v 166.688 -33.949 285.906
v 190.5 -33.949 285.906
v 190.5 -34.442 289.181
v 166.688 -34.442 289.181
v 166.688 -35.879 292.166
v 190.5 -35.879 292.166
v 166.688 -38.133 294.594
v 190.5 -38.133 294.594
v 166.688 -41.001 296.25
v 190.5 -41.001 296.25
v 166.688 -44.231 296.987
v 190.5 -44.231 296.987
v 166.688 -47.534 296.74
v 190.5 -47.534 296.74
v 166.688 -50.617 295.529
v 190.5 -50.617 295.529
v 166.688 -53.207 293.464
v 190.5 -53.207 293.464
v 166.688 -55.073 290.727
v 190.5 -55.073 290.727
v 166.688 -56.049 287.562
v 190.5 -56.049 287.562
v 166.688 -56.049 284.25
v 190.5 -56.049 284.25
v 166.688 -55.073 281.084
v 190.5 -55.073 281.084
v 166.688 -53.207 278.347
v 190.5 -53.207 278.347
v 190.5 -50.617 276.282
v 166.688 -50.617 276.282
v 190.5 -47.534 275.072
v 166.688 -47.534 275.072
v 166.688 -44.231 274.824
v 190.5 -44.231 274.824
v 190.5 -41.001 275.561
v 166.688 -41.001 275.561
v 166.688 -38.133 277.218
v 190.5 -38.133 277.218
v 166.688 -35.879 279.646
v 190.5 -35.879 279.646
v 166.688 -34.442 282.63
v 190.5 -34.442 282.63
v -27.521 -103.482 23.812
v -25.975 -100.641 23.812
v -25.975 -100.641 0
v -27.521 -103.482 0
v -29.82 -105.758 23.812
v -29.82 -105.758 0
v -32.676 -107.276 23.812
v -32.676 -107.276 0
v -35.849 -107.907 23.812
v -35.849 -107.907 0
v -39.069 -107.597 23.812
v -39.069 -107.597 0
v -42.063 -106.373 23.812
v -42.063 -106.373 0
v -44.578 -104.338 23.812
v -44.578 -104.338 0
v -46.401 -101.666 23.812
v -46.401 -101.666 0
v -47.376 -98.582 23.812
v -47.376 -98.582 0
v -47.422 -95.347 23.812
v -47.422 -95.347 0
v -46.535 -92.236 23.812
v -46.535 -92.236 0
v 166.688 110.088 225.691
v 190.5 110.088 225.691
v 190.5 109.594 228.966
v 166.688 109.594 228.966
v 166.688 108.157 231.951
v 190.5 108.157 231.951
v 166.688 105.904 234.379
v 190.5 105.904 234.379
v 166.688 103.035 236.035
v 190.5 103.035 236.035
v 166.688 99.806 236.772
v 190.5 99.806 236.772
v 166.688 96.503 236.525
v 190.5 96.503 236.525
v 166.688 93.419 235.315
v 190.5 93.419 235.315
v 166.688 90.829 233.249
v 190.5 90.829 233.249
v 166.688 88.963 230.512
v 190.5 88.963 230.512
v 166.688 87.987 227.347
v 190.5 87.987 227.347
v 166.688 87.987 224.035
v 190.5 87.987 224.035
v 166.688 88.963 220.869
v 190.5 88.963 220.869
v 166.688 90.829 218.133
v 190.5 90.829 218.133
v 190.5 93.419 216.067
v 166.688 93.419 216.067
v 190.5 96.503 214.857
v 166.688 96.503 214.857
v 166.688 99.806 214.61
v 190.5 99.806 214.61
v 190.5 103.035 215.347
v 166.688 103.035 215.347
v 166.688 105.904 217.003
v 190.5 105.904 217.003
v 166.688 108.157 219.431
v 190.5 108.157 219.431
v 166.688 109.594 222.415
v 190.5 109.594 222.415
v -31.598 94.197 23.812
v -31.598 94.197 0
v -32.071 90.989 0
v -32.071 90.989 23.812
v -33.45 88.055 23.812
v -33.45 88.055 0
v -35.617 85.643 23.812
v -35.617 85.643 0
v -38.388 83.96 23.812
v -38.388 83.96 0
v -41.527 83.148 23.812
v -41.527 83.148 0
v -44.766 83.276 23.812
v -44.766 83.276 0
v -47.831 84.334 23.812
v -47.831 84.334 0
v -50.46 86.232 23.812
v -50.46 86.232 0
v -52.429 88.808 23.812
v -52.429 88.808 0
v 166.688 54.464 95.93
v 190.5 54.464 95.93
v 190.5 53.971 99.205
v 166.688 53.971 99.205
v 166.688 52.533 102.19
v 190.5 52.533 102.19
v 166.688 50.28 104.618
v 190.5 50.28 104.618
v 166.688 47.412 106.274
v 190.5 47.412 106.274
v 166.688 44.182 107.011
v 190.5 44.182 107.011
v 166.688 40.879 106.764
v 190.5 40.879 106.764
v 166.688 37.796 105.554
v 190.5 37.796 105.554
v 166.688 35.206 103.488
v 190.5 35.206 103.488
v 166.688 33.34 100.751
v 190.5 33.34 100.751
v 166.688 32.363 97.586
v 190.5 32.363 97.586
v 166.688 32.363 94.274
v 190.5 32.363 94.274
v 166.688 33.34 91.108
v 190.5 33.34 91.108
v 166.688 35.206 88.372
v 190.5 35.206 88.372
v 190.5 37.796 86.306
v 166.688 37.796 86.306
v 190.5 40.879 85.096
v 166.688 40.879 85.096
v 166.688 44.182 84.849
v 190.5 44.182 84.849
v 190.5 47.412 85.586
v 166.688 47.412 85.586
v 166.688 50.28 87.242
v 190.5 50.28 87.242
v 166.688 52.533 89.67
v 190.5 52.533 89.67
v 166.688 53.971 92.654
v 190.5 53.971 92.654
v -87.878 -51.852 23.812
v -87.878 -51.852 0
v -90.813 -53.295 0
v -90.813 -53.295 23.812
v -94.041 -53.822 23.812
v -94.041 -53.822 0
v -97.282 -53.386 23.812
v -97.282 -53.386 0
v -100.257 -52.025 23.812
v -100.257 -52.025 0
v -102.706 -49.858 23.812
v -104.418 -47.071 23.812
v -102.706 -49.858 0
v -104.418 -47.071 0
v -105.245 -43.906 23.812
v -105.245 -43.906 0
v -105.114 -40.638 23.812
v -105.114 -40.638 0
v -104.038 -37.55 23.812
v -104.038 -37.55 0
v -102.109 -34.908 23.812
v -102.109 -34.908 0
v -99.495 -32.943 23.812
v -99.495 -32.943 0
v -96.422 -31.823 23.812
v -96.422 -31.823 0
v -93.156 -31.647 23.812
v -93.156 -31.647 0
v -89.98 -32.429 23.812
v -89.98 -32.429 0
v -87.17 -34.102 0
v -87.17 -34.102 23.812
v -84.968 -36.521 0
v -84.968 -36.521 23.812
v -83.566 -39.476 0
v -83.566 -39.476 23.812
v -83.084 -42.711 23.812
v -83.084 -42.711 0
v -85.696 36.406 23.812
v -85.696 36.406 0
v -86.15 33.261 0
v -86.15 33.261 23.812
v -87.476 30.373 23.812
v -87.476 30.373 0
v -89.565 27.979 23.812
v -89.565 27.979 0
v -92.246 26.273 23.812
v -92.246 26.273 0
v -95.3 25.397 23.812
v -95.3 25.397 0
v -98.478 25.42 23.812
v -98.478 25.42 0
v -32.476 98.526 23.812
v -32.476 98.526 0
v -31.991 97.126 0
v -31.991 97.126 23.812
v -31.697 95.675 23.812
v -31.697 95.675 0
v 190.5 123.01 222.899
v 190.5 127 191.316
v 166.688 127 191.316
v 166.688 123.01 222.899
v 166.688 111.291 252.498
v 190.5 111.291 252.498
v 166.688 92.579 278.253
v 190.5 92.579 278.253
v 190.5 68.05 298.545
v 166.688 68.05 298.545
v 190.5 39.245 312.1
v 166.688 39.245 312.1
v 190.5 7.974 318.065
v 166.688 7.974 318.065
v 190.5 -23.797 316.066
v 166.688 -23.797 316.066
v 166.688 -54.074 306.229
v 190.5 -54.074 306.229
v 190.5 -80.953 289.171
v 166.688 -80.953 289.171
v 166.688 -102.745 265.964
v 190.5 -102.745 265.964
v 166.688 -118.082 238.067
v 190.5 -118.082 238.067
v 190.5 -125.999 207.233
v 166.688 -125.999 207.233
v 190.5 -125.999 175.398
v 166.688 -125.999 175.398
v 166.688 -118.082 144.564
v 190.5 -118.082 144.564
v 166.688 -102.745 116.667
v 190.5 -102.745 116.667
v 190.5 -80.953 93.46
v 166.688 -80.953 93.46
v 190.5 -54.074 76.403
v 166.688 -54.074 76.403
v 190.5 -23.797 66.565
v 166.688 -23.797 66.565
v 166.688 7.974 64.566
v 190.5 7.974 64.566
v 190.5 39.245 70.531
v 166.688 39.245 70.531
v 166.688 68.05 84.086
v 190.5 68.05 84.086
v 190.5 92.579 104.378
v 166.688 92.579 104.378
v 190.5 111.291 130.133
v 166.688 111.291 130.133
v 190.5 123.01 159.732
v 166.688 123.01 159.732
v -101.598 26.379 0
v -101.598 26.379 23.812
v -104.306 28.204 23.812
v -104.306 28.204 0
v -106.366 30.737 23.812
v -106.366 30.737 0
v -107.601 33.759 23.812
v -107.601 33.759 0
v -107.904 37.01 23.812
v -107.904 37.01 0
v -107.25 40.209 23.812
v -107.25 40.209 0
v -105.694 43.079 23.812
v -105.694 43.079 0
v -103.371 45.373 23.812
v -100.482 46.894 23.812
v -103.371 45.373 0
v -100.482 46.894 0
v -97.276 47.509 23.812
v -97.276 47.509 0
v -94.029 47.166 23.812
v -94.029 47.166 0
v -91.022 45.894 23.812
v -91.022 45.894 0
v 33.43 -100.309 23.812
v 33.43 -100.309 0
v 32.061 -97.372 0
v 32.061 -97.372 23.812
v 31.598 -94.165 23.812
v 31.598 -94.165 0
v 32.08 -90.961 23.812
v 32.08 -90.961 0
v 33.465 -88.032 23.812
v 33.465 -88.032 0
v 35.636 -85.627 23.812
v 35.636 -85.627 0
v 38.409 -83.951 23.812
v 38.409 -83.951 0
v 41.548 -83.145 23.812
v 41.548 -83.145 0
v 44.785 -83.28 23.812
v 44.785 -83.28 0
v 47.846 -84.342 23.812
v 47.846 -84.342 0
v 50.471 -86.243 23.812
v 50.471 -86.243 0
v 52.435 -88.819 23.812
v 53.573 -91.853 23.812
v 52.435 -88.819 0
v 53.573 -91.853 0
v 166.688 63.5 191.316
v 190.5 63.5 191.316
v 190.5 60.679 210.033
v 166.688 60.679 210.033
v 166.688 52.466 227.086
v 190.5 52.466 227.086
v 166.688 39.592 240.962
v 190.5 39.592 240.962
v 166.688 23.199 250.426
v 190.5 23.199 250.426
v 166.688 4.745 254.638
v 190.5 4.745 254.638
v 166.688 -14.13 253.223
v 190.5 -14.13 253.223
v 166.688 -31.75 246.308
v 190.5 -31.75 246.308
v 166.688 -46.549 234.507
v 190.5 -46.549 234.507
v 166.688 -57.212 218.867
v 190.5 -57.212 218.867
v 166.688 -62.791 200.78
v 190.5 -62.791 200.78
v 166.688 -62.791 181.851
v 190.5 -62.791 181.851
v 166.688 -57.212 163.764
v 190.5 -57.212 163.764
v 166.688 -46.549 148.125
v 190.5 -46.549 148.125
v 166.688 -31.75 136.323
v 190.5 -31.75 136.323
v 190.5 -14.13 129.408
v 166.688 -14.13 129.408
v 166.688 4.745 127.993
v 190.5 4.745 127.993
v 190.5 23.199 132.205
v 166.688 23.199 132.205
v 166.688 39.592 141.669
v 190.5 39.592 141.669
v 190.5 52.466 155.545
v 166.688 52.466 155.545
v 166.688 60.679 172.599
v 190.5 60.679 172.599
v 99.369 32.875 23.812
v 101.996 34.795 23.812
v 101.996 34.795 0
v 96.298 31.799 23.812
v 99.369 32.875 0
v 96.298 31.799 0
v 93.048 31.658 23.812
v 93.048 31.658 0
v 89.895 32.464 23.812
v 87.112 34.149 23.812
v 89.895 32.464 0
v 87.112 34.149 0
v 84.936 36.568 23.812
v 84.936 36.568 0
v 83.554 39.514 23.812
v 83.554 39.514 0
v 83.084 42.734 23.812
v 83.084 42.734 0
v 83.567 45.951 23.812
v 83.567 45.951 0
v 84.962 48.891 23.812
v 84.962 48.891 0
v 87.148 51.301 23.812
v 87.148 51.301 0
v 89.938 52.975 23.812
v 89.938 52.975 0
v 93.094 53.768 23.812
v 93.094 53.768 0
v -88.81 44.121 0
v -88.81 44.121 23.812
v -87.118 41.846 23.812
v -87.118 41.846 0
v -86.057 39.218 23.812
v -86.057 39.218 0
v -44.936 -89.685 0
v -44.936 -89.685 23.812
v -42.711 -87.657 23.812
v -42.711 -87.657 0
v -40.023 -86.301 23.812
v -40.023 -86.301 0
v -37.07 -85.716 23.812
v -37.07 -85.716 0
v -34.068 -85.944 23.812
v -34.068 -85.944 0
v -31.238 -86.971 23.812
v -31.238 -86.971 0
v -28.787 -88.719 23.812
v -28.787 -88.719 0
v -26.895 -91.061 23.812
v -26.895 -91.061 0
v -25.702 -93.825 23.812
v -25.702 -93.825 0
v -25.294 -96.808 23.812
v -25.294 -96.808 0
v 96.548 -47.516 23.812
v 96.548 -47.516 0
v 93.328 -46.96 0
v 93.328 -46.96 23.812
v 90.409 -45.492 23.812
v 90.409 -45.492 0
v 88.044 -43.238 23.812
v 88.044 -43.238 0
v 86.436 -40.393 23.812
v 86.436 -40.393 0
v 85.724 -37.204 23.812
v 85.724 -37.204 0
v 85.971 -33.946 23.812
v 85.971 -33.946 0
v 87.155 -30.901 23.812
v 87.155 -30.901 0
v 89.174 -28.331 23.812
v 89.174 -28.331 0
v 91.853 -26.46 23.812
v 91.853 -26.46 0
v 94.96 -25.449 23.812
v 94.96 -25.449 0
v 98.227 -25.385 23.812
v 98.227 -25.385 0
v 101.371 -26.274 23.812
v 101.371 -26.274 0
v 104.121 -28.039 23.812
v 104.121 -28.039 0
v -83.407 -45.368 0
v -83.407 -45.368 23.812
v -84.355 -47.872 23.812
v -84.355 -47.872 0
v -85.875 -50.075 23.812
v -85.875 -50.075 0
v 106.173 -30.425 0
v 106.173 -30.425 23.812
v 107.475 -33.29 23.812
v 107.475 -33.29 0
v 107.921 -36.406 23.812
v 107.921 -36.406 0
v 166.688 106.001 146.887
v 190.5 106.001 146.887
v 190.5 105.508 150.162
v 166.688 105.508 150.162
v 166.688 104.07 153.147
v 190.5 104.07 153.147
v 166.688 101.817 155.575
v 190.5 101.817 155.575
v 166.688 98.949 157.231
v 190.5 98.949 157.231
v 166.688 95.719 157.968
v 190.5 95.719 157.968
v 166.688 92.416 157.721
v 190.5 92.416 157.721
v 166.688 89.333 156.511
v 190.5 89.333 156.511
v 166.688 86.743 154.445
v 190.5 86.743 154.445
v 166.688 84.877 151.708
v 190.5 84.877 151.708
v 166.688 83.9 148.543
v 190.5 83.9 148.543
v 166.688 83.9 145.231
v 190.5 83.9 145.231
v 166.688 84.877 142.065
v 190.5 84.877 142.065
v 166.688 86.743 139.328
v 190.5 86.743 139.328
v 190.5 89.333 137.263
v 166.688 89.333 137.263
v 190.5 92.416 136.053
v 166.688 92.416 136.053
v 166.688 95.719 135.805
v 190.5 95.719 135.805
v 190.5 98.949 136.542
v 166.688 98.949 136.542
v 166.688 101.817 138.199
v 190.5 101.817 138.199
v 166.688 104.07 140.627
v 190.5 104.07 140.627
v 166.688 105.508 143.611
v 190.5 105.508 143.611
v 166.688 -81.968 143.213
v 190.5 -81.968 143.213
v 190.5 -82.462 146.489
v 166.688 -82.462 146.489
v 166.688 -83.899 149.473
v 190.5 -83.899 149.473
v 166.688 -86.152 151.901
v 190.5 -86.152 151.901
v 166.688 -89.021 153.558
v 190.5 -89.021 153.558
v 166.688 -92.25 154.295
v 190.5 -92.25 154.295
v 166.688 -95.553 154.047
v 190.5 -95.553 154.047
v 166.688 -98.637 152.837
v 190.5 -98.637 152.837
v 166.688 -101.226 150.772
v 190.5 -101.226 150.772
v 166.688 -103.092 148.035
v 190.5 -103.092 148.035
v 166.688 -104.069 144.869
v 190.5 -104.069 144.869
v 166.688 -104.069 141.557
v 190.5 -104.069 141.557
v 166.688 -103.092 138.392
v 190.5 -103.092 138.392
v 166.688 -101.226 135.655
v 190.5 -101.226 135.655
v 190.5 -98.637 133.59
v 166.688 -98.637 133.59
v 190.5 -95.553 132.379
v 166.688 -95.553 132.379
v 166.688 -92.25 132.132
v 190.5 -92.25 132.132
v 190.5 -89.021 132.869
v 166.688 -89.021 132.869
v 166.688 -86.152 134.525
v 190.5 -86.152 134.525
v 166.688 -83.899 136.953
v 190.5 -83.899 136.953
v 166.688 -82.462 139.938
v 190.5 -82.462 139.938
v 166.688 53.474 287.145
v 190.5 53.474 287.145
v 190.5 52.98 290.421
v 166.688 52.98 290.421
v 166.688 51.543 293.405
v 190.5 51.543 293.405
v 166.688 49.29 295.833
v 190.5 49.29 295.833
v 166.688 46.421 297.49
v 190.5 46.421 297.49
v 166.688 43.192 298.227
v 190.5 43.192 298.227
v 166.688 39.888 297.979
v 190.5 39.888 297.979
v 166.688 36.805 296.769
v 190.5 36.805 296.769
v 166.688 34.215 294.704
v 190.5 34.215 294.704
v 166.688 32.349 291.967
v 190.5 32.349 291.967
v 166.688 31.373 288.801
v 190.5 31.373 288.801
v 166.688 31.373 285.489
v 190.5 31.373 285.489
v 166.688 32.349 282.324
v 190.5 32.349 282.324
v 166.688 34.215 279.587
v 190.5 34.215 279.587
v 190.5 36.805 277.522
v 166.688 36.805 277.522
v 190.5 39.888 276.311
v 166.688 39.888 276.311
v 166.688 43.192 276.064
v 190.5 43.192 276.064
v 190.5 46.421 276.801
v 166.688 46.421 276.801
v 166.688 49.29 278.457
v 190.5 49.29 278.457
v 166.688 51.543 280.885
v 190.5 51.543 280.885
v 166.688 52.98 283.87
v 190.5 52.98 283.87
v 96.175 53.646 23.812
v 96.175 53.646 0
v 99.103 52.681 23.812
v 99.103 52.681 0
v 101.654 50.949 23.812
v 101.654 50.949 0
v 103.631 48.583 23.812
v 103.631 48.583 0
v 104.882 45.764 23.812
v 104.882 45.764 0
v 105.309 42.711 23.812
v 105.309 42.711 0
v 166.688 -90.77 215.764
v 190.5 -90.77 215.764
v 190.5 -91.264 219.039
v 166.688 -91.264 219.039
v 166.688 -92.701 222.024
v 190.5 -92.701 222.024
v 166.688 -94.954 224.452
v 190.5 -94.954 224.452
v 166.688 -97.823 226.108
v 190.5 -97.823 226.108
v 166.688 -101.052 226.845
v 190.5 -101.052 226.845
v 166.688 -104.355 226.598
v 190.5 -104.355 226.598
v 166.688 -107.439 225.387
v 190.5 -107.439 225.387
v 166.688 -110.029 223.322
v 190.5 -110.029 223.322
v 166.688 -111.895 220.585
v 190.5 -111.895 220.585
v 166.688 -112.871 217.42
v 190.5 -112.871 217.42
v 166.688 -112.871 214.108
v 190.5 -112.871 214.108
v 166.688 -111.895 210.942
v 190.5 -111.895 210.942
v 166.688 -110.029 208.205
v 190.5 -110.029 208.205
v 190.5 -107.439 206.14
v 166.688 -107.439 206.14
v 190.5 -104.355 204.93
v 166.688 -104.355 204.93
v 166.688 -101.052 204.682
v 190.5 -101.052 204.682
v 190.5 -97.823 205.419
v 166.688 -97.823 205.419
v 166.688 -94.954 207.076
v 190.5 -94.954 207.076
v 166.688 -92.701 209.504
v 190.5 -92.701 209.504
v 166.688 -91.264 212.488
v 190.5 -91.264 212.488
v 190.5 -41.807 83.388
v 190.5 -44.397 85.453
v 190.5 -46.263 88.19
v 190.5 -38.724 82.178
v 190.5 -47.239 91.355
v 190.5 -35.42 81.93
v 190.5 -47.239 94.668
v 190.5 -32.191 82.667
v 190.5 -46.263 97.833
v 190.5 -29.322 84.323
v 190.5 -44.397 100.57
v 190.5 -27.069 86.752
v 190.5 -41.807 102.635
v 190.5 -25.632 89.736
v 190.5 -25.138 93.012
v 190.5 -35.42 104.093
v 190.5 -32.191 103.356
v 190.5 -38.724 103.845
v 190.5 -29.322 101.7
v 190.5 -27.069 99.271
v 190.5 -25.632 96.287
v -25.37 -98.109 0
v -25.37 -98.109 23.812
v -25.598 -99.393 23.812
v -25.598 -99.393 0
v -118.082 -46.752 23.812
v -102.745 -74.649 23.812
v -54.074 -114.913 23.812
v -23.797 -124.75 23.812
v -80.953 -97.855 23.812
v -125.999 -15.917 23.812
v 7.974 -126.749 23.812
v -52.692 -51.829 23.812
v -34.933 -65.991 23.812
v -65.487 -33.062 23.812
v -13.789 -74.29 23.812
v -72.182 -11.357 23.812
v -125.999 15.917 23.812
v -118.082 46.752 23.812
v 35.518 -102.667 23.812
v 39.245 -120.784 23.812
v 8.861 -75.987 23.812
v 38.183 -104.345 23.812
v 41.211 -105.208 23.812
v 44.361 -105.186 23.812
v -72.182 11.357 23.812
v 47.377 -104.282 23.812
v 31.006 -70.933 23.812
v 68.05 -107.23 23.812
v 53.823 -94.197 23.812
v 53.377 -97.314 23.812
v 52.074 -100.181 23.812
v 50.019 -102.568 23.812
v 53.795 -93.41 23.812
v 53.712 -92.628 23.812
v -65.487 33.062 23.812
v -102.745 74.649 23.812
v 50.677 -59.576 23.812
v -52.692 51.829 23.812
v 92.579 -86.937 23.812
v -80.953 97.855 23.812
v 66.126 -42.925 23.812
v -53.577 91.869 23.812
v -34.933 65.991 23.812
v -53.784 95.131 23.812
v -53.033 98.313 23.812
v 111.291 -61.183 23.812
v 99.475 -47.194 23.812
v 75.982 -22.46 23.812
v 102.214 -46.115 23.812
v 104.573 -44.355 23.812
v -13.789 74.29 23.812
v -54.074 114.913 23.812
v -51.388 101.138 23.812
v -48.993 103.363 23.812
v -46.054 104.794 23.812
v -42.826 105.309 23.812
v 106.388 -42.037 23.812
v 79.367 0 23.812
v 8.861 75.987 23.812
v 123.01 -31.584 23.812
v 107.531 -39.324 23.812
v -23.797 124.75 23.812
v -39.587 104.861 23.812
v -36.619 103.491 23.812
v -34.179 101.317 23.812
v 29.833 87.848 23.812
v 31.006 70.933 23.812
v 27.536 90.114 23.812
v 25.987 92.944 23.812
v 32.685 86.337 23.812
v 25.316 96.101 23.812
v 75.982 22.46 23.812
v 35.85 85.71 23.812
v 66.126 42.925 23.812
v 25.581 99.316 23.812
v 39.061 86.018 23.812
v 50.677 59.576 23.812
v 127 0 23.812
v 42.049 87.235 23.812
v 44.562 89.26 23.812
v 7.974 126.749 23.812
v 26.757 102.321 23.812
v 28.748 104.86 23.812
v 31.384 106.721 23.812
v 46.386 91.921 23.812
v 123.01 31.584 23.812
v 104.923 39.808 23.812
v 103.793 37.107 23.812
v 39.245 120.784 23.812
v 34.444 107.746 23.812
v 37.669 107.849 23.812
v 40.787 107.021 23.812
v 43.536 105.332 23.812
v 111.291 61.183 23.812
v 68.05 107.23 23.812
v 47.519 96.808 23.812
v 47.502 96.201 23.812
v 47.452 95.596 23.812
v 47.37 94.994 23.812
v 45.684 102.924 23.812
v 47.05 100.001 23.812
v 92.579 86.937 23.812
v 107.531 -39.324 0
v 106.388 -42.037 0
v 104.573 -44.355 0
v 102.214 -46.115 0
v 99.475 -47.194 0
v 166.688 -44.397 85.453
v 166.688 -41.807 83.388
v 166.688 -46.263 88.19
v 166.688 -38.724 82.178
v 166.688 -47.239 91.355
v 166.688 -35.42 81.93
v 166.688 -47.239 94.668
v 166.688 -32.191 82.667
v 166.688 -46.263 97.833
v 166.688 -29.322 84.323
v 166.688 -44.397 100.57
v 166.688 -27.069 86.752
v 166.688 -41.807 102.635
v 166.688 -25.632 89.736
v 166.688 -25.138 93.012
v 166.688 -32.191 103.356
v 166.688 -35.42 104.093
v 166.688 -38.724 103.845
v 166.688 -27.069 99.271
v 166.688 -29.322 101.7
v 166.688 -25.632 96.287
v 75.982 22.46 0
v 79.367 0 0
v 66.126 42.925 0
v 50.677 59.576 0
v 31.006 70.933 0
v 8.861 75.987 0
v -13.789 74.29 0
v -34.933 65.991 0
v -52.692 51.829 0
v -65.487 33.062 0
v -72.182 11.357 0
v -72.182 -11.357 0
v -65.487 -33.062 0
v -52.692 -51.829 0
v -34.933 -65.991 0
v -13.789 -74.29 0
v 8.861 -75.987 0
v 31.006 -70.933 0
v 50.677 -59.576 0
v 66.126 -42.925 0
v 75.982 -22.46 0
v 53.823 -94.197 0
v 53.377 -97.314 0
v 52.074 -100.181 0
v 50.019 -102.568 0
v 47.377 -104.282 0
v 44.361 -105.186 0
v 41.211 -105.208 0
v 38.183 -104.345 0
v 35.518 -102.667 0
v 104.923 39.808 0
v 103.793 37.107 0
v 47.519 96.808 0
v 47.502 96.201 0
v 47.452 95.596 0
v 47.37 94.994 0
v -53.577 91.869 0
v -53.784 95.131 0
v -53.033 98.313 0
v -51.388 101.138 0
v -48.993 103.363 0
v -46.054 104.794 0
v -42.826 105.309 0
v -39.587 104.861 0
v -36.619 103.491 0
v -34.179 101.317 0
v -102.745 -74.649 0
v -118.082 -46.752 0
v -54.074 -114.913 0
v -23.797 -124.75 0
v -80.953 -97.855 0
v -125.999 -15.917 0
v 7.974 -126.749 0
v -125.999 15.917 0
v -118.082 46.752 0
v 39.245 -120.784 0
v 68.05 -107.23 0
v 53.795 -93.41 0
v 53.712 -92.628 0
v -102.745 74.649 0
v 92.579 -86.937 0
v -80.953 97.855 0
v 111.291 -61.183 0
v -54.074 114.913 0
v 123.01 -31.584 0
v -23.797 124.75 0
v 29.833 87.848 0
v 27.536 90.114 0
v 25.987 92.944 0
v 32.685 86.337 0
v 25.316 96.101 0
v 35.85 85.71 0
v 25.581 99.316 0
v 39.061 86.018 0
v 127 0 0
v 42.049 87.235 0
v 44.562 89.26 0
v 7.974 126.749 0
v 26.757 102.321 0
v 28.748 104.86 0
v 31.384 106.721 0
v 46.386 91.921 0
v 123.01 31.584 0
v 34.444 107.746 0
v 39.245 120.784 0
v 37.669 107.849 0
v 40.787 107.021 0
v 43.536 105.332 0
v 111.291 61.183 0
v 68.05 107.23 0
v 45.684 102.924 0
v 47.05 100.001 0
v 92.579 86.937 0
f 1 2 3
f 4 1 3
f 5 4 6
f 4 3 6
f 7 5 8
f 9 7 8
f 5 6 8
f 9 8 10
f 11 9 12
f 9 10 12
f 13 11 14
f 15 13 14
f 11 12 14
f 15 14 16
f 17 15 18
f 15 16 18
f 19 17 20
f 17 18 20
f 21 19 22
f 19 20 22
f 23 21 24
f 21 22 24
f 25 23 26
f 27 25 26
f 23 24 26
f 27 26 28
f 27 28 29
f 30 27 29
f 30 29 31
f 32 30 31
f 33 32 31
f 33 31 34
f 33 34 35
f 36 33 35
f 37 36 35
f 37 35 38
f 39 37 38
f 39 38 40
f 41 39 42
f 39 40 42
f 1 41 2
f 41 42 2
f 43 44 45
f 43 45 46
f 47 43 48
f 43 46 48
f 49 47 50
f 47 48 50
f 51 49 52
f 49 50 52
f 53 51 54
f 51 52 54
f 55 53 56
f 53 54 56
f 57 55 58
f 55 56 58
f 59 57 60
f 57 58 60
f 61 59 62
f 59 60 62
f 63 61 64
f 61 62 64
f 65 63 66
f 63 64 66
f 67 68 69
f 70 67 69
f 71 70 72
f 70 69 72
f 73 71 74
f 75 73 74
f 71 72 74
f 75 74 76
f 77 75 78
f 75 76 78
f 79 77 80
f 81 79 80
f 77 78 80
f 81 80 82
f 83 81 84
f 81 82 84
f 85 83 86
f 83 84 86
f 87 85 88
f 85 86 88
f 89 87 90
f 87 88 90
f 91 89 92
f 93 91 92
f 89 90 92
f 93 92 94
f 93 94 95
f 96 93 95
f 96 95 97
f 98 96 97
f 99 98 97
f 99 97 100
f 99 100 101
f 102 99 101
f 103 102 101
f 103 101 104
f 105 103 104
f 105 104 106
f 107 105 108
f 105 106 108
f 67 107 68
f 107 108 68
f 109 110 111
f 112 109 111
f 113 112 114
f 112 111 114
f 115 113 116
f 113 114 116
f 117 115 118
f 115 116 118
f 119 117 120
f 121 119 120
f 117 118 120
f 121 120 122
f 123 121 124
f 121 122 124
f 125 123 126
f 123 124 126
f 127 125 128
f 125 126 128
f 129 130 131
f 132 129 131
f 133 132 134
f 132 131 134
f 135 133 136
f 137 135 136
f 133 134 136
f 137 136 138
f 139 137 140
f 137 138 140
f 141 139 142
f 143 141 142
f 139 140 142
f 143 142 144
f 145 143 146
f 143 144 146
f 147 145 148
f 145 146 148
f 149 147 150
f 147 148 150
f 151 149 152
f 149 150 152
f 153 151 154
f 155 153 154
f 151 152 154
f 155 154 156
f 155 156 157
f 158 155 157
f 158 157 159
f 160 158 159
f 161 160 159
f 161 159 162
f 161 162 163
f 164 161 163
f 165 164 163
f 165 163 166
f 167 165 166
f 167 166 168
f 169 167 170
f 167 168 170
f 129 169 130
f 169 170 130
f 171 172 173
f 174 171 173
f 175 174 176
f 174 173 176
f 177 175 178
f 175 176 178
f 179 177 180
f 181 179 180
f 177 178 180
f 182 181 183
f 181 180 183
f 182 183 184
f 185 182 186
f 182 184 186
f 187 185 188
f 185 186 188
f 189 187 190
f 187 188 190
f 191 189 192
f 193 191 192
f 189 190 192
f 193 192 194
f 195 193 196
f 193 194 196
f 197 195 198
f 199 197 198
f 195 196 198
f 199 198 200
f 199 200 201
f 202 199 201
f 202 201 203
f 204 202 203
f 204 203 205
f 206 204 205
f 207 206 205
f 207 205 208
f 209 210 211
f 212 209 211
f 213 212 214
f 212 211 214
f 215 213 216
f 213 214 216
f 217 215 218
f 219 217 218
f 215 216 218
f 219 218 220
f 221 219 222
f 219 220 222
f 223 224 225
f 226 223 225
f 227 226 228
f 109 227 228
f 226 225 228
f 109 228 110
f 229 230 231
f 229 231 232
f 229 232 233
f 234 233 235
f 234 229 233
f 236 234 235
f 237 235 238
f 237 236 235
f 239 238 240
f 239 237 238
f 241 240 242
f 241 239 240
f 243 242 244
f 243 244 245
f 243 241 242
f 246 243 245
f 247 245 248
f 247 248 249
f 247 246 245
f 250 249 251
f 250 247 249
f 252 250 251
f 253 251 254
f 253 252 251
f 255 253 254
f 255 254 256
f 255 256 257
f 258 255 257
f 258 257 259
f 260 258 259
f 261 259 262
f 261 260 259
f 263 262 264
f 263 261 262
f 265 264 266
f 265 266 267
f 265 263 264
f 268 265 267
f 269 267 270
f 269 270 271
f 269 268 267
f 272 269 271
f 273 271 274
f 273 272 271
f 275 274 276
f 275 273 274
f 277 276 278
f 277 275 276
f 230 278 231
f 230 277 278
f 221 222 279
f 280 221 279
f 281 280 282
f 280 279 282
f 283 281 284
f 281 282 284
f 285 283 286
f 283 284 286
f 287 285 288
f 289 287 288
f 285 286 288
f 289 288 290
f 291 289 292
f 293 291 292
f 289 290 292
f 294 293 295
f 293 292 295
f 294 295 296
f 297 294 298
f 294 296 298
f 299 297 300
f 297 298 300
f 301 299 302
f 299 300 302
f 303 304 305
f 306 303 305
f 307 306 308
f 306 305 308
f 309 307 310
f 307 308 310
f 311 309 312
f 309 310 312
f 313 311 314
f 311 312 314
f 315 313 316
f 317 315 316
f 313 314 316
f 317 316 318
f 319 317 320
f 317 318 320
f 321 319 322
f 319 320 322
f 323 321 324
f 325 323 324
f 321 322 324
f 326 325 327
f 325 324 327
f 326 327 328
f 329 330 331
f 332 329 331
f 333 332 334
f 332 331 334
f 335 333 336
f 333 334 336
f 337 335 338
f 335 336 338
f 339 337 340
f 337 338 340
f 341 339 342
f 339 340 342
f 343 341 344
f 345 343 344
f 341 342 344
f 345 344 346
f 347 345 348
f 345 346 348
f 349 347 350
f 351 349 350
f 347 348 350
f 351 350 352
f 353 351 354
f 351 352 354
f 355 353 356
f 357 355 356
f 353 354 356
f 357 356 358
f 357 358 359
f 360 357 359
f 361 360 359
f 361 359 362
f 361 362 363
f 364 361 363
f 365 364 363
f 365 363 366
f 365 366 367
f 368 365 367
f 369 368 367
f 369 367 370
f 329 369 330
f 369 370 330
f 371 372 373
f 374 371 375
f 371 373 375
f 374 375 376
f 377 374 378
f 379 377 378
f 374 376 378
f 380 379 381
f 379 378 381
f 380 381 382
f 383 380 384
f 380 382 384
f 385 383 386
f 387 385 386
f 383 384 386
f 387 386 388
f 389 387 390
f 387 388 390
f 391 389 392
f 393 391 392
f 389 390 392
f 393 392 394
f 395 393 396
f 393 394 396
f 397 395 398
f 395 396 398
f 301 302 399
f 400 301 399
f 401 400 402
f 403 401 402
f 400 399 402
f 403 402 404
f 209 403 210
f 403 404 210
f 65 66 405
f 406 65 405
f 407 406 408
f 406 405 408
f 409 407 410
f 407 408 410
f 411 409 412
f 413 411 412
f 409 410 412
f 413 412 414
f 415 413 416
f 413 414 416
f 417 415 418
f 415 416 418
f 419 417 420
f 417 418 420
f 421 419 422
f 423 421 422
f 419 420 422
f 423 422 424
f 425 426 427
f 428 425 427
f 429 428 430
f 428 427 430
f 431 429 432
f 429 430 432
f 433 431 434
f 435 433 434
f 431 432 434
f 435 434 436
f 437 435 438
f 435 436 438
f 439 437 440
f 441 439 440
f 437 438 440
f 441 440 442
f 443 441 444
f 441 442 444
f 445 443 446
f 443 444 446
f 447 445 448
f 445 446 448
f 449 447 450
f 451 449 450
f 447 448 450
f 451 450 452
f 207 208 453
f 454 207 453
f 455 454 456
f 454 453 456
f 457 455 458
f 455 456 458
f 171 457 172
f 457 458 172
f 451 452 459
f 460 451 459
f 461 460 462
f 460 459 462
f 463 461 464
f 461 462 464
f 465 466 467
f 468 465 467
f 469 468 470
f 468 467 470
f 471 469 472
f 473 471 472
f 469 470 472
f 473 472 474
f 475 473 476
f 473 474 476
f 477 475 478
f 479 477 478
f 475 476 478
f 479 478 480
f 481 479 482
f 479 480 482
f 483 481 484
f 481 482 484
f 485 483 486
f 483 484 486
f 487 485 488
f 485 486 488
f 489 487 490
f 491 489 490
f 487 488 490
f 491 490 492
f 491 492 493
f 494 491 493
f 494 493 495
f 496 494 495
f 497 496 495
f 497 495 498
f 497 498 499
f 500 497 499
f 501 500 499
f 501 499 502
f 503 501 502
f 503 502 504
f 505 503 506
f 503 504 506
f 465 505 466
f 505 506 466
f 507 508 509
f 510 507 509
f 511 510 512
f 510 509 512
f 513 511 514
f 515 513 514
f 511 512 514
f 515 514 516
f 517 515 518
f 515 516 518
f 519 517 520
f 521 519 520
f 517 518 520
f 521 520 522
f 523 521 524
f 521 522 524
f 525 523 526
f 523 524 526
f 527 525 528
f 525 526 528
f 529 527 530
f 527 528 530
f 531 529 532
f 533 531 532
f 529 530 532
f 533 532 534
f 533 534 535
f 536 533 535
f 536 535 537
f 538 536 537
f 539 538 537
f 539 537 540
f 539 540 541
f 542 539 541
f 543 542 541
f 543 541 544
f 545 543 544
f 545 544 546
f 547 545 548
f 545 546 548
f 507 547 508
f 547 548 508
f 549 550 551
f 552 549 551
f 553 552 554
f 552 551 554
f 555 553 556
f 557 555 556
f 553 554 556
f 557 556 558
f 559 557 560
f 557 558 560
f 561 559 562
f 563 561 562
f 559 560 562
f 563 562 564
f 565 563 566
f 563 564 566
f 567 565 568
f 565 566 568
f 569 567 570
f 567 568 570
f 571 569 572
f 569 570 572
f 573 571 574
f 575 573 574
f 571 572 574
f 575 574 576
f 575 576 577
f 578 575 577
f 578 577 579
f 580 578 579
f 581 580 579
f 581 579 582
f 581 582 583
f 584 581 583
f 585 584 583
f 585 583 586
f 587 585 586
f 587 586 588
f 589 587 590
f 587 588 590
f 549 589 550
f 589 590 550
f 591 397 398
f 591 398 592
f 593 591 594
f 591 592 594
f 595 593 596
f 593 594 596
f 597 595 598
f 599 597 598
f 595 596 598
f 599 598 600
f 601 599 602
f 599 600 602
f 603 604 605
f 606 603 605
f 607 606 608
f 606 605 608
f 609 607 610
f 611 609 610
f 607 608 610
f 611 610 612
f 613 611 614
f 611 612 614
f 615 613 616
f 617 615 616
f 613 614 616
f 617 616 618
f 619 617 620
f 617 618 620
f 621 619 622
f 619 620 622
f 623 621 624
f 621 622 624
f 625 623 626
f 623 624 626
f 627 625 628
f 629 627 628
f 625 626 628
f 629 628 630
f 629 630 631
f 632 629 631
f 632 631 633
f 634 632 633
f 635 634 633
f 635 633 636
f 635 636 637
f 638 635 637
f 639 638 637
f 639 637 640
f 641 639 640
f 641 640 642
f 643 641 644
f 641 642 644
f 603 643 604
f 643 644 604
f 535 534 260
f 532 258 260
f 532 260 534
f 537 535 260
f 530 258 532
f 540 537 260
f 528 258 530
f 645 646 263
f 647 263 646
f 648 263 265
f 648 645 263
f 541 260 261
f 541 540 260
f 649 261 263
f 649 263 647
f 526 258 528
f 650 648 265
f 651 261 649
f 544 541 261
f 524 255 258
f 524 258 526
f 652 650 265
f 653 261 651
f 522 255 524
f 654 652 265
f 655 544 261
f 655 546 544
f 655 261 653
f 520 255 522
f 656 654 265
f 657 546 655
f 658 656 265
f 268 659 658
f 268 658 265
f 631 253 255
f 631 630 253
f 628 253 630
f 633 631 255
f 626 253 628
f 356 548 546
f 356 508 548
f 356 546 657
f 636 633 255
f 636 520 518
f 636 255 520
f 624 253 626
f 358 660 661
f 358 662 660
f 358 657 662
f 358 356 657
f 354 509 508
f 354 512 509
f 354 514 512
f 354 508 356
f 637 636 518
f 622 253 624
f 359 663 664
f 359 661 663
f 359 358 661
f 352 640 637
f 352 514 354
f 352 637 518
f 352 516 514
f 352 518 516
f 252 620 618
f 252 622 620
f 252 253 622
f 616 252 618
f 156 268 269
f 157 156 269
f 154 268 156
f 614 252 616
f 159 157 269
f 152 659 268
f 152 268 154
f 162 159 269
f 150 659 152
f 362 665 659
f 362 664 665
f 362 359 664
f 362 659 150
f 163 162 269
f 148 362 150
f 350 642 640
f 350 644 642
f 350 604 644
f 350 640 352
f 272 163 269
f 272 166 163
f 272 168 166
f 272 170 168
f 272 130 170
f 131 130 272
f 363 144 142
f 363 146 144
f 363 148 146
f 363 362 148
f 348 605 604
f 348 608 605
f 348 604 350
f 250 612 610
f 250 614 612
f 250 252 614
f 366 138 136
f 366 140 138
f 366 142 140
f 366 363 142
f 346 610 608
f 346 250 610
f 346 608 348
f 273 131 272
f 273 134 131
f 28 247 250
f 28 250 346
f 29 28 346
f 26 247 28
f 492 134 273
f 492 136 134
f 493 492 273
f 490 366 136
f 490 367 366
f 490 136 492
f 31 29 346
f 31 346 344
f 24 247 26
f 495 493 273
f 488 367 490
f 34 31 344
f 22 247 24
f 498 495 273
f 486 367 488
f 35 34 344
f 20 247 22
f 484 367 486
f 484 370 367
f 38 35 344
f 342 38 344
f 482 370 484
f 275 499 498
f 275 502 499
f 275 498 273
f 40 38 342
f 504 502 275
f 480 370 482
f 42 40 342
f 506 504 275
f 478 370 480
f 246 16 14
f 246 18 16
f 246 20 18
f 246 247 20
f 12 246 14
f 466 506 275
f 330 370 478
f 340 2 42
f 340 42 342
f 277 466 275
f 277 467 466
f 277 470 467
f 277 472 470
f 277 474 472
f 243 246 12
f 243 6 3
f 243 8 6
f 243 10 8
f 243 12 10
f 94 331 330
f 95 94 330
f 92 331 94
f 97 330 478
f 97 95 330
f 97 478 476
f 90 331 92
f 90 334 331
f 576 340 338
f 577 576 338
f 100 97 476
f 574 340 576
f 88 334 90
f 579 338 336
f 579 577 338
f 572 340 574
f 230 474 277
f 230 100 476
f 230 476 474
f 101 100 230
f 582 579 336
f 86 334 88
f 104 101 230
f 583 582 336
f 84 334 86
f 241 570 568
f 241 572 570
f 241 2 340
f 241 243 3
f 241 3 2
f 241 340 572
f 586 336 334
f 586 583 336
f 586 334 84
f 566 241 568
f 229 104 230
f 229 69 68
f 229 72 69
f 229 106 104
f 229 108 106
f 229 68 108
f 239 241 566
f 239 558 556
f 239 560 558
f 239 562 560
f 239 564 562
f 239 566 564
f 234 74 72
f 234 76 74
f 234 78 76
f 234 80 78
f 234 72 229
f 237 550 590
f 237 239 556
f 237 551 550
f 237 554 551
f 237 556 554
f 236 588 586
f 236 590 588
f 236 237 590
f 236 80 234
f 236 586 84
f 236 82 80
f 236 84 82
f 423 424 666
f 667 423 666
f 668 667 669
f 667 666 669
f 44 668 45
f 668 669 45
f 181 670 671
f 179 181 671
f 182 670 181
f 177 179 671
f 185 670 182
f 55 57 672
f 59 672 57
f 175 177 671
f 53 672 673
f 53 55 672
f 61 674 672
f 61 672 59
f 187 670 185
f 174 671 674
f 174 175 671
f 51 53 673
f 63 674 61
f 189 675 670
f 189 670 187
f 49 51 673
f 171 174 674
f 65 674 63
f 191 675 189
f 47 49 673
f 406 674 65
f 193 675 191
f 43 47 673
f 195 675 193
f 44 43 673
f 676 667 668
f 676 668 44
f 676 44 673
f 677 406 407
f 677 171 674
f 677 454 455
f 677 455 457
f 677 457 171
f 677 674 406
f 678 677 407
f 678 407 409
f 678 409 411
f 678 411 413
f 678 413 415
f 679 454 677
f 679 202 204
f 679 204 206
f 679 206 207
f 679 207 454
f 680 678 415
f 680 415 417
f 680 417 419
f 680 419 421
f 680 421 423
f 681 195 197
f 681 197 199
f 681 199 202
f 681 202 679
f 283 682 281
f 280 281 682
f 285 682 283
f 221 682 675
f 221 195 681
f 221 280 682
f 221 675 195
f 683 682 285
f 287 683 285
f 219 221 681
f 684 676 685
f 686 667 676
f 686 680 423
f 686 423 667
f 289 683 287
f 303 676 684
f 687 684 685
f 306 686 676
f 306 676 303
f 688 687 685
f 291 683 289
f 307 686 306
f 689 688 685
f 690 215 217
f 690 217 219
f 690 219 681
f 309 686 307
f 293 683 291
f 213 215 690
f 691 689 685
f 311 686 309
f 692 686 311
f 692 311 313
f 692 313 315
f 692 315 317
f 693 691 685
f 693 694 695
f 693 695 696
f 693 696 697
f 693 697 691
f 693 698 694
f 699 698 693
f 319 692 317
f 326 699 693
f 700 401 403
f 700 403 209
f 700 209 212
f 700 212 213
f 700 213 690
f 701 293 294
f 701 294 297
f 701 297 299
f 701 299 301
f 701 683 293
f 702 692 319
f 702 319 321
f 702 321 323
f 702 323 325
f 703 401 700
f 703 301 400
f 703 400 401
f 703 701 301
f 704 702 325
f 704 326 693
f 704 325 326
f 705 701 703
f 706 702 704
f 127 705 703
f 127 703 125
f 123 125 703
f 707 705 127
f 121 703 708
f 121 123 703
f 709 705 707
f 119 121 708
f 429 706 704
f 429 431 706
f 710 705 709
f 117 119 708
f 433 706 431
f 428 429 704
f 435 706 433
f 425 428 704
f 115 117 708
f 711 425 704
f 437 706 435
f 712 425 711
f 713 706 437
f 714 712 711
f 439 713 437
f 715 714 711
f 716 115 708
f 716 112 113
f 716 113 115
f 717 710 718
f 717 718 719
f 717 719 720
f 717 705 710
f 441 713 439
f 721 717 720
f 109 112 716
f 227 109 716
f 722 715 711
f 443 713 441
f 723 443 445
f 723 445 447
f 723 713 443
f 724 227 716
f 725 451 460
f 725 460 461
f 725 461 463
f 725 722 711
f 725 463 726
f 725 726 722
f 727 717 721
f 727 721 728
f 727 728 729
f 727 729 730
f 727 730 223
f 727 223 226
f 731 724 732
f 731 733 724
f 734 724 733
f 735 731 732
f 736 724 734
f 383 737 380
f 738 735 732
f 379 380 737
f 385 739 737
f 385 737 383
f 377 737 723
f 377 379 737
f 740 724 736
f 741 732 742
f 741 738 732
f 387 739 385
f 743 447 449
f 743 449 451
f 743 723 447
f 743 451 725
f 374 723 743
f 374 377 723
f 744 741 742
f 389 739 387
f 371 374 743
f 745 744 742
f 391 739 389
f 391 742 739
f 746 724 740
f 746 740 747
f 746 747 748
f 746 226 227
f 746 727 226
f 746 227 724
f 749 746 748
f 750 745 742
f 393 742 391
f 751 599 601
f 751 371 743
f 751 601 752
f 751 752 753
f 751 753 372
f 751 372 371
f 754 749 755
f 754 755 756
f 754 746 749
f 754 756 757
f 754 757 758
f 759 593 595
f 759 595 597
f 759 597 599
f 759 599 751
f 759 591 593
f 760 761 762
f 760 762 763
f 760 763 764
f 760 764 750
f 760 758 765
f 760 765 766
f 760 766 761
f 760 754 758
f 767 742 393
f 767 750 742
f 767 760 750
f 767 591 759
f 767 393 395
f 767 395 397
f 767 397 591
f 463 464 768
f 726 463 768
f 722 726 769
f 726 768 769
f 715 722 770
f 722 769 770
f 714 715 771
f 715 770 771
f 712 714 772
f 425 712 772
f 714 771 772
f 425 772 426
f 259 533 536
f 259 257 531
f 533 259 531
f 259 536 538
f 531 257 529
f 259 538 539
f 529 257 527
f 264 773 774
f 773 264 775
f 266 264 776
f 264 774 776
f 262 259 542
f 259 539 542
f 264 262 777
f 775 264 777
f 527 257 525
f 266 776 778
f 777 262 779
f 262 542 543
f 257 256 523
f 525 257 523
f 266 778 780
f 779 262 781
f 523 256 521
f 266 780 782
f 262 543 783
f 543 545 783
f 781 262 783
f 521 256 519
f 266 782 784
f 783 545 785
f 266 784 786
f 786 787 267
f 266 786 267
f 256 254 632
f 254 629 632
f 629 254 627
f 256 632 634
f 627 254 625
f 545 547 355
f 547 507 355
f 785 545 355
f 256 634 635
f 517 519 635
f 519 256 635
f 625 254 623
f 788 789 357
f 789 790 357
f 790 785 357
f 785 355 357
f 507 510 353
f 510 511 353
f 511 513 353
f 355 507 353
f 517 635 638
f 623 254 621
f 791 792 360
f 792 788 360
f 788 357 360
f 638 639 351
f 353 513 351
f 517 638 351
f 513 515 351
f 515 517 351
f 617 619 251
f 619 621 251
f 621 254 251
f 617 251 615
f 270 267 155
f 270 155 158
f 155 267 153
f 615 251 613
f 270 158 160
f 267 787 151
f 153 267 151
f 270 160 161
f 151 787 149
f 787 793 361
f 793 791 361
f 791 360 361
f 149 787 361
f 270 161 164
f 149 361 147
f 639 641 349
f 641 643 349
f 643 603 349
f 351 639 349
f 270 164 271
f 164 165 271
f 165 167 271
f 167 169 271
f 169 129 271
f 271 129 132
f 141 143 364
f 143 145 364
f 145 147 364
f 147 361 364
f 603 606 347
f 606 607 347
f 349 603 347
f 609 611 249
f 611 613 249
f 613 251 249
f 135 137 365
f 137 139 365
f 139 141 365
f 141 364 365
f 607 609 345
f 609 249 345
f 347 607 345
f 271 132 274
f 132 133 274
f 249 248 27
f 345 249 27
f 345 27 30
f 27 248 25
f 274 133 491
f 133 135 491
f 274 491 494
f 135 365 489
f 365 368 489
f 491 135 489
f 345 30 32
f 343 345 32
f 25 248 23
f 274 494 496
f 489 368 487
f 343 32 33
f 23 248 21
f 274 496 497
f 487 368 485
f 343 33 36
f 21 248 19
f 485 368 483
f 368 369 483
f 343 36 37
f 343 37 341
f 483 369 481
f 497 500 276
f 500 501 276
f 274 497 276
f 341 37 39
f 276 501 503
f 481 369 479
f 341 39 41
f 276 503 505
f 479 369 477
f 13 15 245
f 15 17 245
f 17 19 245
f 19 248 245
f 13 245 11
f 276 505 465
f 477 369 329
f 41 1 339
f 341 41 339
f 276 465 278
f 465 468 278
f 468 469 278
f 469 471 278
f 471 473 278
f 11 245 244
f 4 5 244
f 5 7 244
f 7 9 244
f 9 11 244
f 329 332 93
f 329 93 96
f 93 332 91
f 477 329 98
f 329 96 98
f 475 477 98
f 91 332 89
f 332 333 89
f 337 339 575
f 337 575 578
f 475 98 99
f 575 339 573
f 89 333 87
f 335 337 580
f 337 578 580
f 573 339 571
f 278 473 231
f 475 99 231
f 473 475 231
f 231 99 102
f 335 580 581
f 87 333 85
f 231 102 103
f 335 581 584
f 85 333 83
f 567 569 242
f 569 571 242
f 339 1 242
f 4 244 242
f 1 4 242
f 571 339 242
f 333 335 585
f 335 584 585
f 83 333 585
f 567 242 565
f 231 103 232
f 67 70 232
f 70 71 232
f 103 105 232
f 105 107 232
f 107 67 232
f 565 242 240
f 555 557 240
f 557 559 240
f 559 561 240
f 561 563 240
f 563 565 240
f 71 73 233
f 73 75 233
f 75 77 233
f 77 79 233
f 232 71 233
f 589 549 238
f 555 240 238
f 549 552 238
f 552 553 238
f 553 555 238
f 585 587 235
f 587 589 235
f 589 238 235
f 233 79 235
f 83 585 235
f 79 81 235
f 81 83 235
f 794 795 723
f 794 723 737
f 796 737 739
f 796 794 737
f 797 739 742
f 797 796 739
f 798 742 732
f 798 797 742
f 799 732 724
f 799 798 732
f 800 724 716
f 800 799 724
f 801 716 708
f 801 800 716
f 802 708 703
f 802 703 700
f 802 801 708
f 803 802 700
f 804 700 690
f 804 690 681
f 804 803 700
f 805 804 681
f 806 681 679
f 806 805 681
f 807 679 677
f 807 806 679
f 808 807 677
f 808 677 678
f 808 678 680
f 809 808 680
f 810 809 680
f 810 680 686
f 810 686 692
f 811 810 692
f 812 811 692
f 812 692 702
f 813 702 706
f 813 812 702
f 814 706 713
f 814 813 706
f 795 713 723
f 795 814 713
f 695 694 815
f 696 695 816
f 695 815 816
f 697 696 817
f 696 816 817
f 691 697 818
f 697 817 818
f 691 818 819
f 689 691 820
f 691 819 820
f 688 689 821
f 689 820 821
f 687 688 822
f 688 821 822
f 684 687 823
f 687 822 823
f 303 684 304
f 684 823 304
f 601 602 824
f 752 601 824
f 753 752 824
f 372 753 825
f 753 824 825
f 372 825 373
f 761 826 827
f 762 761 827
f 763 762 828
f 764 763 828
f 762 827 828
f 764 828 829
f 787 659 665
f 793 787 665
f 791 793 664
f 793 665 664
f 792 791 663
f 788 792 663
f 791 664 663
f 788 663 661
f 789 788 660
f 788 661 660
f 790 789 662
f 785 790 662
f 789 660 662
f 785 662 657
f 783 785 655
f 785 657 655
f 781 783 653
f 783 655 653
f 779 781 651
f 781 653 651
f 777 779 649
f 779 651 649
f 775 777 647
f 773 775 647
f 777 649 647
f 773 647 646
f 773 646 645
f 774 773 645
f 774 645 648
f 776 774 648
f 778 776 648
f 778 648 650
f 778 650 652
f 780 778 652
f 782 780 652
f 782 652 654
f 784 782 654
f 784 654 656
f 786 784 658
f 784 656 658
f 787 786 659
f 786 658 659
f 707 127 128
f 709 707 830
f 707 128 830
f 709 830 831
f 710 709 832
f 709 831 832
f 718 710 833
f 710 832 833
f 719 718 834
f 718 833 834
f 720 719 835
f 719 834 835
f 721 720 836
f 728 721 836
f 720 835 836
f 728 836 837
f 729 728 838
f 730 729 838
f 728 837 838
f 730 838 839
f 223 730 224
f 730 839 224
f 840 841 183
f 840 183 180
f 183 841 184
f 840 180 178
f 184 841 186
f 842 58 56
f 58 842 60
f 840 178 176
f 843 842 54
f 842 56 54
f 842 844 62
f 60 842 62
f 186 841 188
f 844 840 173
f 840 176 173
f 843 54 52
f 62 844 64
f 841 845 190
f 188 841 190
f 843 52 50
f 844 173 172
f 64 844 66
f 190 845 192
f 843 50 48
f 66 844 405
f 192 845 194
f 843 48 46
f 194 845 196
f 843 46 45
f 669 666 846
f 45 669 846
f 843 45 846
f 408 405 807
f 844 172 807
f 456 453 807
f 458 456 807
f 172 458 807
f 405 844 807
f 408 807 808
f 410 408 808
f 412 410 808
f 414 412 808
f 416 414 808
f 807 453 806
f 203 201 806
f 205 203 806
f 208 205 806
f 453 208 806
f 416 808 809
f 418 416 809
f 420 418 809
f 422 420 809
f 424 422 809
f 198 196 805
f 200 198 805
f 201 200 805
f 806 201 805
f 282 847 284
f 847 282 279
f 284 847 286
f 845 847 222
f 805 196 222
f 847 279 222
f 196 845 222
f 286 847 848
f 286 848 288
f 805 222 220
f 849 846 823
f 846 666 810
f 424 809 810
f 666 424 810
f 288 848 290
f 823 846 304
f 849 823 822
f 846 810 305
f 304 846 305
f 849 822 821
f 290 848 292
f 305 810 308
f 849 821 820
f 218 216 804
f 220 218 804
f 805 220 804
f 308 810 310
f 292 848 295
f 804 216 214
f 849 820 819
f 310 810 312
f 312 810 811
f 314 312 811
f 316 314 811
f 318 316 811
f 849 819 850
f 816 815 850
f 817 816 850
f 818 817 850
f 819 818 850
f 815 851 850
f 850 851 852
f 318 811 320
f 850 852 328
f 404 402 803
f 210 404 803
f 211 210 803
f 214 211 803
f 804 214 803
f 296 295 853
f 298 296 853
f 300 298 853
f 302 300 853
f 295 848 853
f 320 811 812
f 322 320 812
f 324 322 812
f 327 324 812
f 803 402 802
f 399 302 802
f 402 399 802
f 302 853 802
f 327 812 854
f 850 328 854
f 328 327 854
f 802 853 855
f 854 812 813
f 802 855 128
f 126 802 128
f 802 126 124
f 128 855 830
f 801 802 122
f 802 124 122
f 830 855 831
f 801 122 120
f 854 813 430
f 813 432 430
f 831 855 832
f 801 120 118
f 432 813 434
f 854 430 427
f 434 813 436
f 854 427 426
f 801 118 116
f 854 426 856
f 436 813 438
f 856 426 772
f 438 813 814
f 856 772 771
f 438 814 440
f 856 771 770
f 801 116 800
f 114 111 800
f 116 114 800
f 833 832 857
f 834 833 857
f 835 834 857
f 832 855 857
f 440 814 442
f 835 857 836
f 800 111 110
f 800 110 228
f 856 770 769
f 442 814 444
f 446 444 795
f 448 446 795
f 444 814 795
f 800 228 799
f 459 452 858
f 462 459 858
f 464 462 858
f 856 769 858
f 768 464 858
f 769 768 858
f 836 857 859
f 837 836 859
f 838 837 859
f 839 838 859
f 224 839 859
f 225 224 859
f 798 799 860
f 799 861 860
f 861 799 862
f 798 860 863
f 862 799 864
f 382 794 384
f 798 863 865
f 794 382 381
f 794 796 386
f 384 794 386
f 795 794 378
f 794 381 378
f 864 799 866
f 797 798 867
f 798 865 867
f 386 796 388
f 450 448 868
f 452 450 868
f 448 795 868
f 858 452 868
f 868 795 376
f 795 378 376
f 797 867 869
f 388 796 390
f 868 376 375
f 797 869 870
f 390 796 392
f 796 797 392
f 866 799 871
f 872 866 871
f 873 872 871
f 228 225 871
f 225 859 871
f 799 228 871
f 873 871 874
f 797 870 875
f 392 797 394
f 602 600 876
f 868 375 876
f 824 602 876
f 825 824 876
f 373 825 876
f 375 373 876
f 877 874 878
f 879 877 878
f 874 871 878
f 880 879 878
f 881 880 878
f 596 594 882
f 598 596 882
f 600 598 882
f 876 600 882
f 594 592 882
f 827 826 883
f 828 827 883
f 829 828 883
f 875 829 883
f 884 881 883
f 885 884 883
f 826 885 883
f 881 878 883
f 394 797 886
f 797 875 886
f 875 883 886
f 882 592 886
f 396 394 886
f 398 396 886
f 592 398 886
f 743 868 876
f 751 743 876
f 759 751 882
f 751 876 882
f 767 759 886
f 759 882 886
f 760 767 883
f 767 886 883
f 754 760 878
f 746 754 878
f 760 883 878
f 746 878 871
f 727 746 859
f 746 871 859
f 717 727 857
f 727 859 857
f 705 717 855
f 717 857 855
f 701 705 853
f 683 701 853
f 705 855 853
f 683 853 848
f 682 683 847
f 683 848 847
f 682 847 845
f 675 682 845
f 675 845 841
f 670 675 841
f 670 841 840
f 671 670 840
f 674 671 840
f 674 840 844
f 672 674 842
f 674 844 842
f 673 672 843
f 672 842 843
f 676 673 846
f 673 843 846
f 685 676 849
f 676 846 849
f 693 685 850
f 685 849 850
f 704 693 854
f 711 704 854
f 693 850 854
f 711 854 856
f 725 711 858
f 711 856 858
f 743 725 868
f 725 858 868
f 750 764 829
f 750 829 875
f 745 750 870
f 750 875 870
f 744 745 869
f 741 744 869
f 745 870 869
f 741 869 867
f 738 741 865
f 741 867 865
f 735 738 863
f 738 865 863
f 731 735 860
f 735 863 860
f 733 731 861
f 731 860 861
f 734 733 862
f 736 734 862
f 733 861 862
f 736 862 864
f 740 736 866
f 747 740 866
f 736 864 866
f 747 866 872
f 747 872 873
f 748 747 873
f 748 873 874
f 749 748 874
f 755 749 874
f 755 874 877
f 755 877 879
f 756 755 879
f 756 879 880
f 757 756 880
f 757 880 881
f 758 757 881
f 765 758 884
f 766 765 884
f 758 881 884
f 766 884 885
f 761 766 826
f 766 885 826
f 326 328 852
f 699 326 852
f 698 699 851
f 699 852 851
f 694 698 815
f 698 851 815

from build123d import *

# Parameters (mm, degrees)
F0_R     = 127
F0_R_2   = 76.2
F1_DEPTH = 23.8125
F4_R     = 127
F4_R_2   = 11.1125
F4_R_3   = 63.5
F5_DEPTH = 23.8125


# Not quite as in the source:
# - the program builds the solid bodies; features that only make, move or delete a surface that nothing else refers to are left out


with BuildPart() as f1:
    # F0 (on Top) → F1 (new body)
    with BuildSketch(Plane.XY):
        Circle(F0_R)
        with BuildLine():
            ThreePointArc((101.9958548396, 34.7946514115), (106.4448025713, 17.6495395986), (107.942049028, 0))
            ThreePointArc((107.942049028, 0), (106.9823052387, -14.1489647287), (104.120656465, -28.03871913))
            ThreePointArc((104.120656465, -28.03871913), (106.9261709336, -31.8112513898), (107.920677619, -36.4062342556))
            ThreePointArc((107.920677619, -36.4062342556), (104.5734800406, -44.3553055569), (96.548306946, -47.5156952454))
            ThreePointArc((96.548306946, -47.5156952454), (78.4010780991, -72.9221605187), (53.5731929065, -91.8532595192))
            ThreePointArc((53.5731929065, -91.8532595192), (53.7604643817, -93.0183920588), (53.8231237491, -94.1968139884))
            ThreePointArc((53.8231237491, -94.1968139884), (45.9011634738, -104.8414423292), (33.4302126102, -100.3092296601))
            ThreePointArc((33.4302126102, -100.3092296601), (3.751342164, -104.7733707892), (-25.9754714164, -100.6405193108))
            ThreePointArc((-25.9754714164, -100.6405193108), (-40.6110553172, -107.0944371963), (-46.5346943911, -92.2363124052))
            ThreePointArc((-46.5346943911, -92.2363124052), (-70.0459417897, -74.9510413572), (-87.8779817622, -51.8517405051))
            ThreePointArc((-87.8779817622, -51.8517405051), (-104.373234586, -47.1747160498), (-96.6430601698, -31.8707189585))
            ThreePointArc((-96.6430601698, -31.8707189585), (-101.5542755055, -3.3533286372), (-98.4775871181, 25.4198459422))
            ThreePointArc((-98.4775871181, 25.4198459422), (-107.24989988, 40.2086140993), (-91.0220503046, 45.893509257))
            ThreePointArc((-91.0220503046, 45.893509257), (-74.7387890105, 70.0605525565), (-52.4291016529, 88.8080438613))
            ThreePointArc((-52.4291016529, 88.8080438613), (-47.5764375285, 104.187385169), (-32.4760746868, 98.5259780812))
            ThreePointArc((-32.4760746868, 98.5259780812), (-3.176203782, 104.5828081894), (26.6409177774, 102.1115963588))
            ThreePointArc((26.6409177774, 102.1115963588), (39.1421597741, 107.5786171554), (47.5187342556, 96.808177619))
            ThreePointArc((47.5187342556, 96.808177619), (47.4814140774, 95.8982061001), (47.3697042146, 94.994346671))
            ThreePointArc((47.3697042146, 94.994346671), (73.3279865341, 77.8154449532), (93.0935679461, 53.7682231459))
            ThreePointArc((93.0935679461, 53.7682231459), (101.6542879107, 50.9491757425), (105.3093139884, 42.7106237491))
            ThreePointArc((105.3093139884, 42.7106237491), (104.4475334195, 38.4198886844), (101.9958548396, 34.7946514115))
        make_face(mode=Mode.SUBTRACT)
        with BuildLine():
            ThreePointArc((104.120656465, -28.03871913), (106.9823052387, -14.1489647287), (107.942049028, 0))
            ThreePointArc((107.942049028, 0), (106.4448025713, 17.6495395986), (101.9958548396, 34.7946514115))
            ThreePointArc((101.9958548396, 34.7946514115), (84.1366190041, 37.9904401586), (93.0935679461, 53.7682231459))
            ThreePointArc((93.0935679461, 53.7682231459), (73.3279865341, 77.8154449532), (47.3697042146, 94.994346671))
            ThreePointArc((47.3697042146, 94.994346671), (32.7975359141, 86.2979467686), (26.6409177774, 102.1115963588))
            ThreePointArc((26.6409177774, 102.1115963588), (-3.176203782, 104.5828081894), (-32.4760746868, 98.5259780812))
            ThreePointArc((-32.4760746868, 98.5259780812), (-31.8198229818, 96.4054594778), (-31.5981237491, 94.1968139884))
            ThreePointArc((-31.5981237491, 94.1968139884), (-39.9275435721, 83.4384627681), (-52.4291016529, 88.8080438613))
            ThreePointArc((-52.4291016529, 88.8080438613), (-74.7387890105, 70.0605525565), (-91.0220503046, 45.893509257))
            ThreePointArc((-91.0220503046, 45.893509257), (-87.1183376815, 41.8463315189), (-85.695677619, 36.4062342556))
            ThreePointArc((-85.695677619, 36.4062342556), (-89.5646859475, 27.9789283603), (-98.4775871181, 25.4198459422))
            ThreePointArc((-98.4775871181, 25.4198459422), (-101.5542755055, -3.3533286372), (-96.6430601698, -31.8707189585))
            ThreePointArc((-96.6430601698, -31.8707189585), (-87.2576589404, -34.031004894), (-83.0843139884, -42.7106237491))
            ThreePointArc((-83.0843139884, -42.7106237491), (-84.3554299555, -47.8715167502), (-87.8779817622, -51.8517405051))
            ThreePointArc((-87.8779817622, -51.8517405051), (-70.0459417897, -74.9510413572), (-46.5346943911, -92.2363124052))
            ThreePointArc((-46.5346943911, -92.2363124052), (-34.067950377, -85.9444726915), (-25.2937342556, -96.808177619))
            ThreePointArc((-25.2937342556, -96.808177619), (-25.4654959739, -98.7544309683), (-25.9754714164, -100.6405193108))
            ThreePointArc((-25.9754714164, -100.6405193108), (3.751342164, -104.7733707892), (33.4302126102, -100.3092296601))
            ThreePointArc((33.4302126102, -100.3092296601), (38.4092677124, -83.9505467415), (53.5731929065, -91.8532595192))
            ThreePointArc((53.5731929065, -91.8532595192), (78.4010780991, -72.9221605187), (96.548306946, -47.5156952454))
            ThreePointArc((96.548306946, -47.5156952454), (86.45091108, -32.3794879152), (104.120656465, -28.03871913))
        make_face()
        with Locations((3.167049028, 0)):
            Circle(F0_R_2, mode=Mode.SUBTRACT)
    extrude(amount=F1_DEPTH)


with BuildPart() as f5:
    # F4 (on offset) → F5 (new body)
    with BuildSketch(Plane.YZ.offset(190.5)):
        with Locations((0, 191.315561533)):
            Circle(F4_R)
        with Locations((-36.2507900525, 93.011539003)):
            Circle(F4_R_2, mode=Mode.SUBTRACT)
        with Locations((-93.0804328953, 143.21323688)):
            Circle(F4_R_2, mode=Mode.SUBTRACT)
        with Locations((43.3518492061, 95.9299347572)):
            Circle(F4_R_2, mode=Mode.SUBTRACT)
        with Locations((94.8888080869, 146.8868014237)):
            Circle(F4_R_2, mode=Mode.SUBTRACT)
        with Locations((-101.882713284, 215.7637385384)):
            Circle(F4_R_2, mode=Mode.SUBTRACT)
        with Locations((-45.0610448925, 285.9057452636)):
            Circle(F4_R_2, mode=Mode.SUBTRACT)
        with Locations((0, 191.315561533)):
            Circle(F4_R_3, mode=Mode.SUBTRACT)
        with Locations((98.9754160548, 225.6909545021)):
            Circle(F4_R_2, mode=Mode.SUBTRACT)
        with Locations((42.3611944988, 287.1452533077)):
            Circle(F4_R_2, mode=Mode.SUBTRACT)
    extrude(amount=-F5_DEPTH)


solid = Compound([f1.part, f5.part])
